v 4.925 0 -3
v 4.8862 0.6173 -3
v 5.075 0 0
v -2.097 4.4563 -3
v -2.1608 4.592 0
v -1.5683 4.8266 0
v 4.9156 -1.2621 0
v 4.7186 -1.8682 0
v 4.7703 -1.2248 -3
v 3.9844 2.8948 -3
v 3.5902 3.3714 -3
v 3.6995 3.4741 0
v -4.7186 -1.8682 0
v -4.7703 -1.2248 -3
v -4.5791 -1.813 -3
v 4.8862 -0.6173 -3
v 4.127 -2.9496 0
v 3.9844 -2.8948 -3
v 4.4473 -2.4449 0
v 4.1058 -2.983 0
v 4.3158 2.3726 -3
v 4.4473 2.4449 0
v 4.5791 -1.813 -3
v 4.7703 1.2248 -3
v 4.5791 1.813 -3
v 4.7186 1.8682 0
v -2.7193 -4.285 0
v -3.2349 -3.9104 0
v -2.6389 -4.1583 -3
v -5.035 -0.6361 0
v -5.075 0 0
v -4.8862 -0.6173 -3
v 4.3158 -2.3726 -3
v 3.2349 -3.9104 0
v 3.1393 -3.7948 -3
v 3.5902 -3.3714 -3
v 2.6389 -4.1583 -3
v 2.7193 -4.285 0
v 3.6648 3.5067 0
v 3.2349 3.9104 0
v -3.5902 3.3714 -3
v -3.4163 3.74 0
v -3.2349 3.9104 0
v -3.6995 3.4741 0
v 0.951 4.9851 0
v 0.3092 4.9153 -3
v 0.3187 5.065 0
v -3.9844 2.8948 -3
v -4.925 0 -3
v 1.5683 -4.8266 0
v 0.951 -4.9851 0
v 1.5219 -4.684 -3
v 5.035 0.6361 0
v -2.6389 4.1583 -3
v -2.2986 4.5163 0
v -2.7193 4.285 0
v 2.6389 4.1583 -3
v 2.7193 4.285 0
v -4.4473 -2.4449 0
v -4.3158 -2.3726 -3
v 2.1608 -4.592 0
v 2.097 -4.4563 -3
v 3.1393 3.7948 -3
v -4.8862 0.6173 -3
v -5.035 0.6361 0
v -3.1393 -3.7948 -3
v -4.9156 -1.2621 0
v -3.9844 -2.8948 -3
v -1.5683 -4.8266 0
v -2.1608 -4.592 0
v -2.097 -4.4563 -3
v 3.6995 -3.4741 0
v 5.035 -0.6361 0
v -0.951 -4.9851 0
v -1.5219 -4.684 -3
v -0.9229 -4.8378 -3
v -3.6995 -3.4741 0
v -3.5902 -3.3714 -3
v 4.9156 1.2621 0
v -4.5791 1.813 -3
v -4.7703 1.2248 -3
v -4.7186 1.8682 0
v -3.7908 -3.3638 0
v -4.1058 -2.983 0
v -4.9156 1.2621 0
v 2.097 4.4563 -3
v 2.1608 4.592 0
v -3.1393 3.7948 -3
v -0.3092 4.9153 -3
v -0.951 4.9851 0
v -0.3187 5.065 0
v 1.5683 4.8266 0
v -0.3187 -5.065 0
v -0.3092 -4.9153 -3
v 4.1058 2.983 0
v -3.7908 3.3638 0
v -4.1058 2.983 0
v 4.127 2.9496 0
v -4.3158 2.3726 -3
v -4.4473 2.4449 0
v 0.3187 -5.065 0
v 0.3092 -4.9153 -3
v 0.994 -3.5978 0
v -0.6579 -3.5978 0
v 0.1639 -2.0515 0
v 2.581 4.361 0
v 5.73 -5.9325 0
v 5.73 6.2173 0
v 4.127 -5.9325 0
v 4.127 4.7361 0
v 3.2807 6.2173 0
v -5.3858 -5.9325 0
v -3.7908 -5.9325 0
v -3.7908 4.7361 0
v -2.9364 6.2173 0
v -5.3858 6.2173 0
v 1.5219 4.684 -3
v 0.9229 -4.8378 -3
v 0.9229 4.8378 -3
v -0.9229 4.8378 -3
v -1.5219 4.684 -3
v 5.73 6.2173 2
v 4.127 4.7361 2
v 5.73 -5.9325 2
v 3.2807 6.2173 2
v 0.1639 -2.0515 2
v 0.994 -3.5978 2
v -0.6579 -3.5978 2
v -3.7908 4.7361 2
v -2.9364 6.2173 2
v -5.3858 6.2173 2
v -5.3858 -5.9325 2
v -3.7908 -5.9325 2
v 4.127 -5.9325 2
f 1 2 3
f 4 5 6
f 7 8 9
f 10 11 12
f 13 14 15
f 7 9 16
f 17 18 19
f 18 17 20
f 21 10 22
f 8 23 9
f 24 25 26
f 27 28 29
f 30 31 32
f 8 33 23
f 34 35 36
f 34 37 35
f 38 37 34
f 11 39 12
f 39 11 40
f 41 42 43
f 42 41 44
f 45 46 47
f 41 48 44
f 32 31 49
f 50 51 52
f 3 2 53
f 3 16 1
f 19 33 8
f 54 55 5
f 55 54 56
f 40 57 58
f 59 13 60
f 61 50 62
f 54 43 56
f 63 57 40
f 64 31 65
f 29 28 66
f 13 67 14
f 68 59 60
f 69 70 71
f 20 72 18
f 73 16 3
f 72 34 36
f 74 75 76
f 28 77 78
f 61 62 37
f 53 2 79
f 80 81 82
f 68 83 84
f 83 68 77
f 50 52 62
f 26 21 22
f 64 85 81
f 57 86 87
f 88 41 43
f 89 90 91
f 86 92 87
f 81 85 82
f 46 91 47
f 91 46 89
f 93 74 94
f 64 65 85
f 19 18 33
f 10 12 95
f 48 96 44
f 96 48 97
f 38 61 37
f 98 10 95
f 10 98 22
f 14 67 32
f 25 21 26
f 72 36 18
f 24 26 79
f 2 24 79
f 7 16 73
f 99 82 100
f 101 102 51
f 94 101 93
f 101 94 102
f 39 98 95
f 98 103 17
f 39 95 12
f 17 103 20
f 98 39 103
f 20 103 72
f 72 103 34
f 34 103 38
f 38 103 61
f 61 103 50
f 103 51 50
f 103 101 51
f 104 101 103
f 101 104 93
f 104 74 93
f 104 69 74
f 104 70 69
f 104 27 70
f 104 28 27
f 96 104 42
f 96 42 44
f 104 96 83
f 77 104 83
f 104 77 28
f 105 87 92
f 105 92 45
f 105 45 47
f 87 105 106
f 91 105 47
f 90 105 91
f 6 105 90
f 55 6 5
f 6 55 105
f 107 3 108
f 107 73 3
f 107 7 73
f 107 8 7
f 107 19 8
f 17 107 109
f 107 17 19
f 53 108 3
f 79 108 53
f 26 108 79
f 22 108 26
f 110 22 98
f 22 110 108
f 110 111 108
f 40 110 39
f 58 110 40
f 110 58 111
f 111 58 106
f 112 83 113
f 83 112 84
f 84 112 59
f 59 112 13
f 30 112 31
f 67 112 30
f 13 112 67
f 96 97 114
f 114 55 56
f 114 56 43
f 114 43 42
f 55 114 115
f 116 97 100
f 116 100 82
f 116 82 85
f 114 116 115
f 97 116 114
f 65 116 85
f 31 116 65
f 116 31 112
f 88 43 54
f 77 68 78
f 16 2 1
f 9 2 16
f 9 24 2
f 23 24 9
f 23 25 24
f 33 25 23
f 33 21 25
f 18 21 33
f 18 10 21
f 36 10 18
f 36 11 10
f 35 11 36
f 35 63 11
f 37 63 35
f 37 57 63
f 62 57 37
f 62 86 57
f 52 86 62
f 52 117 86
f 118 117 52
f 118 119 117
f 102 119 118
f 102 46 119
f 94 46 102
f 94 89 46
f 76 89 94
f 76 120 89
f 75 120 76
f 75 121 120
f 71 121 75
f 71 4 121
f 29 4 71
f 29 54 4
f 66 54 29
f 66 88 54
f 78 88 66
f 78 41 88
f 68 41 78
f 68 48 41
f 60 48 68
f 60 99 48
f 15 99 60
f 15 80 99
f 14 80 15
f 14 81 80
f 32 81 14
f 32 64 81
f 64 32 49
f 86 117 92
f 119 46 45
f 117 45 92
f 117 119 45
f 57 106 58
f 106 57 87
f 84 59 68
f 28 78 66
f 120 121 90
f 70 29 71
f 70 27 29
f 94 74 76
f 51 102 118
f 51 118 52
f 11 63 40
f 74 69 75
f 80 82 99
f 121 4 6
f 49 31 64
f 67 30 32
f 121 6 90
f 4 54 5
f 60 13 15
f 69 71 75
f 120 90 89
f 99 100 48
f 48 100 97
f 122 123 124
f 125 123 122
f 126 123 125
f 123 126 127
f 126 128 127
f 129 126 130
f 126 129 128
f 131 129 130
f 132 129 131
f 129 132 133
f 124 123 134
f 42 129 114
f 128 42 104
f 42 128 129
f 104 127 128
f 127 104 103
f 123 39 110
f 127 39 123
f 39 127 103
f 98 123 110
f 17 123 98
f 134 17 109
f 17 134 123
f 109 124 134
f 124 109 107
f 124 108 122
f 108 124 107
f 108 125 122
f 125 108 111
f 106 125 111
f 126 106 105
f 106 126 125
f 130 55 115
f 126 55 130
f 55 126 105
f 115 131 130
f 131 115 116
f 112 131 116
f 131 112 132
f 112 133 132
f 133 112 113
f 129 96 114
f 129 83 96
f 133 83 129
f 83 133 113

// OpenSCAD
$fn = 50;


difference() {
	union() {
		translate(v = [0, 0, -3.0000000000]) {
			cylinder(h = 3, r1 = 4.9250000000, r2 = 5.0750000000);
		}
		linear_extrude(height = 2) {
			text(font = "Impact", halign = "center", size = 12, text = "M", valign = "center");
		}
	}
	union();
}
